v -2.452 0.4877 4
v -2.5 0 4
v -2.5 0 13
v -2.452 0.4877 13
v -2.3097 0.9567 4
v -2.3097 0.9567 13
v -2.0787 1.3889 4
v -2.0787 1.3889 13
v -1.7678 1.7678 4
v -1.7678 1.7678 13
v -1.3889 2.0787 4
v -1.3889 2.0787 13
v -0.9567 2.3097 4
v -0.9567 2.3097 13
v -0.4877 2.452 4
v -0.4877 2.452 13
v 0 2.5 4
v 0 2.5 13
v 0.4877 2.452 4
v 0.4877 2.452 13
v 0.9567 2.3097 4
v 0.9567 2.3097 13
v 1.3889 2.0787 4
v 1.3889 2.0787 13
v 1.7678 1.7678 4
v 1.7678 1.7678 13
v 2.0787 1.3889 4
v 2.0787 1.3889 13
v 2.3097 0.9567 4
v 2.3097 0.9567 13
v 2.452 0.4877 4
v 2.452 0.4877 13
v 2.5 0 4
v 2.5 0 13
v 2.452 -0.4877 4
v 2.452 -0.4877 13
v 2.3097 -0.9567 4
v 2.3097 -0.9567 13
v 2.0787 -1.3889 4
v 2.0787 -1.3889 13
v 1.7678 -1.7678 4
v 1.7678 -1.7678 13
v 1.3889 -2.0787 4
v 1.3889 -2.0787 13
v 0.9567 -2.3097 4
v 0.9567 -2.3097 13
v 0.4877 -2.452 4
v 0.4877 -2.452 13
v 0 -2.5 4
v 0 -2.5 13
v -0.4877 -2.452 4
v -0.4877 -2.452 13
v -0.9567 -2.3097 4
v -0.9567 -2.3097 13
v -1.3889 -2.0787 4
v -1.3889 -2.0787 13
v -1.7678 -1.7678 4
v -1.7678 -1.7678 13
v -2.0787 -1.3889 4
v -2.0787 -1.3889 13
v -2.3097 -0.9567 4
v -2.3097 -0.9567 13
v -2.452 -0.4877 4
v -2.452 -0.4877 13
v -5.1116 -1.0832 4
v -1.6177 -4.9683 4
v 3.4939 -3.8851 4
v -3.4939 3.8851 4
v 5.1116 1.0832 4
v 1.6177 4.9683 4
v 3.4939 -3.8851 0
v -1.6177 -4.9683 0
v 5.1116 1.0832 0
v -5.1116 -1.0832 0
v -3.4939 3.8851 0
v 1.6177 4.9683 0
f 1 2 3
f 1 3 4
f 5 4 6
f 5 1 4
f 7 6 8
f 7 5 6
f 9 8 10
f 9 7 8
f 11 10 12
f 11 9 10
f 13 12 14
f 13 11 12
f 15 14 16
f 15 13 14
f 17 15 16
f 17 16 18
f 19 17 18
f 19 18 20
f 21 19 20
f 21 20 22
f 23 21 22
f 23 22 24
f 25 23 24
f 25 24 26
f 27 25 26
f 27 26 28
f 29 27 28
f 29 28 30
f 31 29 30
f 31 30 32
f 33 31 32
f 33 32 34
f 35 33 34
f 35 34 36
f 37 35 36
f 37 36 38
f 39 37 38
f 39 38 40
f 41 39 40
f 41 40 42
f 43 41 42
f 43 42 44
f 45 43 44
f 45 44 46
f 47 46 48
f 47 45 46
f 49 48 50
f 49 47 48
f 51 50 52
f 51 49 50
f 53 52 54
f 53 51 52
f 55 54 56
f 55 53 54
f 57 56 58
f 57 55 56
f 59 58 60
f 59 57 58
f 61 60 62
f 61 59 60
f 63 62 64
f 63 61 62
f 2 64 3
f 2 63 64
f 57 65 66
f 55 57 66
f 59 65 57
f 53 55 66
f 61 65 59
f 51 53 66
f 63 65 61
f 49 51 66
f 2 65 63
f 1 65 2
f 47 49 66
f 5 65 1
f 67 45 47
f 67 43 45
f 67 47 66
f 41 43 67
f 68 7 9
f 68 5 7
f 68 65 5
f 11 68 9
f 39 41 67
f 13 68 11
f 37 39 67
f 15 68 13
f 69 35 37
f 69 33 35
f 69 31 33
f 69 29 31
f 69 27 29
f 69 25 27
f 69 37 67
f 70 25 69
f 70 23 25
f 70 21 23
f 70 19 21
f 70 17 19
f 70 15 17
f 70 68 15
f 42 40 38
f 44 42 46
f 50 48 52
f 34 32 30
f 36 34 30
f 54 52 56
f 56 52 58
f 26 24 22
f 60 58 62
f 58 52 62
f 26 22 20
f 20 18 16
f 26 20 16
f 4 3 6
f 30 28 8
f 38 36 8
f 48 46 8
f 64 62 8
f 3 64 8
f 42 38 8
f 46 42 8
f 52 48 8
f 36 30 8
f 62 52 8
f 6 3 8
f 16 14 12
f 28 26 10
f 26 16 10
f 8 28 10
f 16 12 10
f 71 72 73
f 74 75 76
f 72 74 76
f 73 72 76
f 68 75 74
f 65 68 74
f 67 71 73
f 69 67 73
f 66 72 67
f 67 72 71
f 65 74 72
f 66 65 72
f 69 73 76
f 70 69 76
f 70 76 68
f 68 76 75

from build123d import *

# Parameters (mm, degrees)
SKETCH1_R           = 2.5
BOSS_EXTRUDE3_DEPTH = 4
SKETCH2_R           = 2.5
BOSS_EXTRUDE4_DEPTH = 13


with BuildPart() as part:
    # Sketch1 → Boss-Extrude3 (new body)
    with BuildSketch(Plane.XY):
        Polygon((3.493859283, -3.885138771), (5.111558514, 1.08320151), (1.617699232, 4.968340281), (-3.493859283, 3.885138771), (-5.111558514, -1.08320151), (-1.617699232, -4.968340281), align=None)
        Circle(SKETCH1_R, mode=Mode.SUBTRACT)
    extrude(amount=BOSS_EXTRUDE3_DEPTH)

    # Sketch2 → Boss-Extrude4 (add)
    with BuildSketch(Plane(origin=(0, 0, 0), x_dir=(-1, 0, 0), z_dir=(0, 0, -1))):
        Circle(SKETCH2_R)
    extrude(amount=-BOSS_EXTRUDE4_DEPTH)


solid = part.part
